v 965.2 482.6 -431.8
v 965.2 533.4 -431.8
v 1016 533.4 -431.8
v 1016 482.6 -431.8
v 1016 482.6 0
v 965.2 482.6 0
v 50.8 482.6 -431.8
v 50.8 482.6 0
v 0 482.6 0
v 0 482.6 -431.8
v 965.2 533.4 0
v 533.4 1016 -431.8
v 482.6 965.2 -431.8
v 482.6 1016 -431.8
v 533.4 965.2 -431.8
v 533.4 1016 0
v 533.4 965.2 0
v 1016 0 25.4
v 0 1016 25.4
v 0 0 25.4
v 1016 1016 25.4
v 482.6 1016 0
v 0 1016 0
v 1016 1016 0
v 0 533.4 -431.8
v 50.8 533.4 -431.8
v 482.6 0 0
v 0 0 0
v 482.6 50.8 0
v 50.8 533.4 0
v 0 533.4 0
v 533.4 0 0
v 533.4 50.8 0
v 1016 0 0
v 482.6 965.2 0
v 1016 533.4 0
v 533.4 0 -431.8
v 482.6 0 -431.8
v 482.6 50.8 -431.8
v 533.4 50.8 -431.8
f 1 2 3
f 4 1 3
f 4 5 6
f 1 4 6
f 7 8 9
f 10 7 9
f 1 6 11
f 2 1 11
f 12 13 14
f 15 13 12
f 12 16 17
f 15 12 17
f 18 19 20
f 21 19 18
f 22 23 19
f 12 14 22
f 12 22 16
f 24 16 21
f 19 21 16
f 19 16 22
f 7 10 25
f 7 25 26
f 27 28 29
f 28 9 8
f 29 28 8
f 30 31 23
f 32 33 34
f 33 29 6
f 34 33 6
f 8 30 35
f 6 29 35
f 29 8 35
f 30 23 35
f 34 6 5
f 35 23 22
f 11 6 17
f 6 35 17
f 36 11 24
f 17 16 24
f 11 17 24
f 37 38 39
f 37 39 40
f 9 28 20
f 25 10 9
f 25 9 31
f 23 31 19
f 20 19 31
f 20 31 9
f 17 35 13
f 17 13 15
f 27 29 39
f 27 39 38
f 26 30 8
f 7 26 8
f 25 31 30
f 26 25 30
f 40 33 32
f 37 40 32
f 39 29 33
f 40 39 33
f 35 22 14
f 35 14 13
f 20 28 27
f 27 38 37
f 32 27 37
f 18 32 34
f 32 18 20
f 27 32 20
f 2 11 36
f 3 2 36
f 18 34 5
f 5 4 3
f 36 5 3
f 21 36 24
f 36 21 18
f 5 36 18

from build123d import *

# Parameters (mm, degrees)
F0_W     = 1016
F0_H     = 1016
F1_DEPTH = 25.4
F2_W     = 50.8
F2_H     = 50.8
F3_DEPTH = 431.8


with BuildPart() as f1:
    # F0 (on Top) → F1 (new body)
    with BuildSketch(Plane.XY):
        with Locations((508, 508)):
            Rectangle(F0_W, F0_H)
    extrude(amount=F1_DEPTH)

    # F2 (on face) → F3 (join)
    with BuildSketch(Plane(origin=(0, 0, 0), x_dir=(1, 0, 0), z_dir=(0, 0, -1))):
        Polygon((50.8, -482.6), (0, -482.6), (0, -508), (0, -533.4), (50.8, -533.4), align=None)
        Polygon((1016, -533.4), (1016, -508), (1016, -482.6), (965.2, -482.6), (965.2, -533.4), align=None)
        with Locations((508, -990.6)):
            Rectangle(F2_W, F2_H)
        with Locations((508, -25.4)):
            Rectangle(F2_W, F2_H)
    extrude(amount=F3_DEPTH)


solid = f1.part
